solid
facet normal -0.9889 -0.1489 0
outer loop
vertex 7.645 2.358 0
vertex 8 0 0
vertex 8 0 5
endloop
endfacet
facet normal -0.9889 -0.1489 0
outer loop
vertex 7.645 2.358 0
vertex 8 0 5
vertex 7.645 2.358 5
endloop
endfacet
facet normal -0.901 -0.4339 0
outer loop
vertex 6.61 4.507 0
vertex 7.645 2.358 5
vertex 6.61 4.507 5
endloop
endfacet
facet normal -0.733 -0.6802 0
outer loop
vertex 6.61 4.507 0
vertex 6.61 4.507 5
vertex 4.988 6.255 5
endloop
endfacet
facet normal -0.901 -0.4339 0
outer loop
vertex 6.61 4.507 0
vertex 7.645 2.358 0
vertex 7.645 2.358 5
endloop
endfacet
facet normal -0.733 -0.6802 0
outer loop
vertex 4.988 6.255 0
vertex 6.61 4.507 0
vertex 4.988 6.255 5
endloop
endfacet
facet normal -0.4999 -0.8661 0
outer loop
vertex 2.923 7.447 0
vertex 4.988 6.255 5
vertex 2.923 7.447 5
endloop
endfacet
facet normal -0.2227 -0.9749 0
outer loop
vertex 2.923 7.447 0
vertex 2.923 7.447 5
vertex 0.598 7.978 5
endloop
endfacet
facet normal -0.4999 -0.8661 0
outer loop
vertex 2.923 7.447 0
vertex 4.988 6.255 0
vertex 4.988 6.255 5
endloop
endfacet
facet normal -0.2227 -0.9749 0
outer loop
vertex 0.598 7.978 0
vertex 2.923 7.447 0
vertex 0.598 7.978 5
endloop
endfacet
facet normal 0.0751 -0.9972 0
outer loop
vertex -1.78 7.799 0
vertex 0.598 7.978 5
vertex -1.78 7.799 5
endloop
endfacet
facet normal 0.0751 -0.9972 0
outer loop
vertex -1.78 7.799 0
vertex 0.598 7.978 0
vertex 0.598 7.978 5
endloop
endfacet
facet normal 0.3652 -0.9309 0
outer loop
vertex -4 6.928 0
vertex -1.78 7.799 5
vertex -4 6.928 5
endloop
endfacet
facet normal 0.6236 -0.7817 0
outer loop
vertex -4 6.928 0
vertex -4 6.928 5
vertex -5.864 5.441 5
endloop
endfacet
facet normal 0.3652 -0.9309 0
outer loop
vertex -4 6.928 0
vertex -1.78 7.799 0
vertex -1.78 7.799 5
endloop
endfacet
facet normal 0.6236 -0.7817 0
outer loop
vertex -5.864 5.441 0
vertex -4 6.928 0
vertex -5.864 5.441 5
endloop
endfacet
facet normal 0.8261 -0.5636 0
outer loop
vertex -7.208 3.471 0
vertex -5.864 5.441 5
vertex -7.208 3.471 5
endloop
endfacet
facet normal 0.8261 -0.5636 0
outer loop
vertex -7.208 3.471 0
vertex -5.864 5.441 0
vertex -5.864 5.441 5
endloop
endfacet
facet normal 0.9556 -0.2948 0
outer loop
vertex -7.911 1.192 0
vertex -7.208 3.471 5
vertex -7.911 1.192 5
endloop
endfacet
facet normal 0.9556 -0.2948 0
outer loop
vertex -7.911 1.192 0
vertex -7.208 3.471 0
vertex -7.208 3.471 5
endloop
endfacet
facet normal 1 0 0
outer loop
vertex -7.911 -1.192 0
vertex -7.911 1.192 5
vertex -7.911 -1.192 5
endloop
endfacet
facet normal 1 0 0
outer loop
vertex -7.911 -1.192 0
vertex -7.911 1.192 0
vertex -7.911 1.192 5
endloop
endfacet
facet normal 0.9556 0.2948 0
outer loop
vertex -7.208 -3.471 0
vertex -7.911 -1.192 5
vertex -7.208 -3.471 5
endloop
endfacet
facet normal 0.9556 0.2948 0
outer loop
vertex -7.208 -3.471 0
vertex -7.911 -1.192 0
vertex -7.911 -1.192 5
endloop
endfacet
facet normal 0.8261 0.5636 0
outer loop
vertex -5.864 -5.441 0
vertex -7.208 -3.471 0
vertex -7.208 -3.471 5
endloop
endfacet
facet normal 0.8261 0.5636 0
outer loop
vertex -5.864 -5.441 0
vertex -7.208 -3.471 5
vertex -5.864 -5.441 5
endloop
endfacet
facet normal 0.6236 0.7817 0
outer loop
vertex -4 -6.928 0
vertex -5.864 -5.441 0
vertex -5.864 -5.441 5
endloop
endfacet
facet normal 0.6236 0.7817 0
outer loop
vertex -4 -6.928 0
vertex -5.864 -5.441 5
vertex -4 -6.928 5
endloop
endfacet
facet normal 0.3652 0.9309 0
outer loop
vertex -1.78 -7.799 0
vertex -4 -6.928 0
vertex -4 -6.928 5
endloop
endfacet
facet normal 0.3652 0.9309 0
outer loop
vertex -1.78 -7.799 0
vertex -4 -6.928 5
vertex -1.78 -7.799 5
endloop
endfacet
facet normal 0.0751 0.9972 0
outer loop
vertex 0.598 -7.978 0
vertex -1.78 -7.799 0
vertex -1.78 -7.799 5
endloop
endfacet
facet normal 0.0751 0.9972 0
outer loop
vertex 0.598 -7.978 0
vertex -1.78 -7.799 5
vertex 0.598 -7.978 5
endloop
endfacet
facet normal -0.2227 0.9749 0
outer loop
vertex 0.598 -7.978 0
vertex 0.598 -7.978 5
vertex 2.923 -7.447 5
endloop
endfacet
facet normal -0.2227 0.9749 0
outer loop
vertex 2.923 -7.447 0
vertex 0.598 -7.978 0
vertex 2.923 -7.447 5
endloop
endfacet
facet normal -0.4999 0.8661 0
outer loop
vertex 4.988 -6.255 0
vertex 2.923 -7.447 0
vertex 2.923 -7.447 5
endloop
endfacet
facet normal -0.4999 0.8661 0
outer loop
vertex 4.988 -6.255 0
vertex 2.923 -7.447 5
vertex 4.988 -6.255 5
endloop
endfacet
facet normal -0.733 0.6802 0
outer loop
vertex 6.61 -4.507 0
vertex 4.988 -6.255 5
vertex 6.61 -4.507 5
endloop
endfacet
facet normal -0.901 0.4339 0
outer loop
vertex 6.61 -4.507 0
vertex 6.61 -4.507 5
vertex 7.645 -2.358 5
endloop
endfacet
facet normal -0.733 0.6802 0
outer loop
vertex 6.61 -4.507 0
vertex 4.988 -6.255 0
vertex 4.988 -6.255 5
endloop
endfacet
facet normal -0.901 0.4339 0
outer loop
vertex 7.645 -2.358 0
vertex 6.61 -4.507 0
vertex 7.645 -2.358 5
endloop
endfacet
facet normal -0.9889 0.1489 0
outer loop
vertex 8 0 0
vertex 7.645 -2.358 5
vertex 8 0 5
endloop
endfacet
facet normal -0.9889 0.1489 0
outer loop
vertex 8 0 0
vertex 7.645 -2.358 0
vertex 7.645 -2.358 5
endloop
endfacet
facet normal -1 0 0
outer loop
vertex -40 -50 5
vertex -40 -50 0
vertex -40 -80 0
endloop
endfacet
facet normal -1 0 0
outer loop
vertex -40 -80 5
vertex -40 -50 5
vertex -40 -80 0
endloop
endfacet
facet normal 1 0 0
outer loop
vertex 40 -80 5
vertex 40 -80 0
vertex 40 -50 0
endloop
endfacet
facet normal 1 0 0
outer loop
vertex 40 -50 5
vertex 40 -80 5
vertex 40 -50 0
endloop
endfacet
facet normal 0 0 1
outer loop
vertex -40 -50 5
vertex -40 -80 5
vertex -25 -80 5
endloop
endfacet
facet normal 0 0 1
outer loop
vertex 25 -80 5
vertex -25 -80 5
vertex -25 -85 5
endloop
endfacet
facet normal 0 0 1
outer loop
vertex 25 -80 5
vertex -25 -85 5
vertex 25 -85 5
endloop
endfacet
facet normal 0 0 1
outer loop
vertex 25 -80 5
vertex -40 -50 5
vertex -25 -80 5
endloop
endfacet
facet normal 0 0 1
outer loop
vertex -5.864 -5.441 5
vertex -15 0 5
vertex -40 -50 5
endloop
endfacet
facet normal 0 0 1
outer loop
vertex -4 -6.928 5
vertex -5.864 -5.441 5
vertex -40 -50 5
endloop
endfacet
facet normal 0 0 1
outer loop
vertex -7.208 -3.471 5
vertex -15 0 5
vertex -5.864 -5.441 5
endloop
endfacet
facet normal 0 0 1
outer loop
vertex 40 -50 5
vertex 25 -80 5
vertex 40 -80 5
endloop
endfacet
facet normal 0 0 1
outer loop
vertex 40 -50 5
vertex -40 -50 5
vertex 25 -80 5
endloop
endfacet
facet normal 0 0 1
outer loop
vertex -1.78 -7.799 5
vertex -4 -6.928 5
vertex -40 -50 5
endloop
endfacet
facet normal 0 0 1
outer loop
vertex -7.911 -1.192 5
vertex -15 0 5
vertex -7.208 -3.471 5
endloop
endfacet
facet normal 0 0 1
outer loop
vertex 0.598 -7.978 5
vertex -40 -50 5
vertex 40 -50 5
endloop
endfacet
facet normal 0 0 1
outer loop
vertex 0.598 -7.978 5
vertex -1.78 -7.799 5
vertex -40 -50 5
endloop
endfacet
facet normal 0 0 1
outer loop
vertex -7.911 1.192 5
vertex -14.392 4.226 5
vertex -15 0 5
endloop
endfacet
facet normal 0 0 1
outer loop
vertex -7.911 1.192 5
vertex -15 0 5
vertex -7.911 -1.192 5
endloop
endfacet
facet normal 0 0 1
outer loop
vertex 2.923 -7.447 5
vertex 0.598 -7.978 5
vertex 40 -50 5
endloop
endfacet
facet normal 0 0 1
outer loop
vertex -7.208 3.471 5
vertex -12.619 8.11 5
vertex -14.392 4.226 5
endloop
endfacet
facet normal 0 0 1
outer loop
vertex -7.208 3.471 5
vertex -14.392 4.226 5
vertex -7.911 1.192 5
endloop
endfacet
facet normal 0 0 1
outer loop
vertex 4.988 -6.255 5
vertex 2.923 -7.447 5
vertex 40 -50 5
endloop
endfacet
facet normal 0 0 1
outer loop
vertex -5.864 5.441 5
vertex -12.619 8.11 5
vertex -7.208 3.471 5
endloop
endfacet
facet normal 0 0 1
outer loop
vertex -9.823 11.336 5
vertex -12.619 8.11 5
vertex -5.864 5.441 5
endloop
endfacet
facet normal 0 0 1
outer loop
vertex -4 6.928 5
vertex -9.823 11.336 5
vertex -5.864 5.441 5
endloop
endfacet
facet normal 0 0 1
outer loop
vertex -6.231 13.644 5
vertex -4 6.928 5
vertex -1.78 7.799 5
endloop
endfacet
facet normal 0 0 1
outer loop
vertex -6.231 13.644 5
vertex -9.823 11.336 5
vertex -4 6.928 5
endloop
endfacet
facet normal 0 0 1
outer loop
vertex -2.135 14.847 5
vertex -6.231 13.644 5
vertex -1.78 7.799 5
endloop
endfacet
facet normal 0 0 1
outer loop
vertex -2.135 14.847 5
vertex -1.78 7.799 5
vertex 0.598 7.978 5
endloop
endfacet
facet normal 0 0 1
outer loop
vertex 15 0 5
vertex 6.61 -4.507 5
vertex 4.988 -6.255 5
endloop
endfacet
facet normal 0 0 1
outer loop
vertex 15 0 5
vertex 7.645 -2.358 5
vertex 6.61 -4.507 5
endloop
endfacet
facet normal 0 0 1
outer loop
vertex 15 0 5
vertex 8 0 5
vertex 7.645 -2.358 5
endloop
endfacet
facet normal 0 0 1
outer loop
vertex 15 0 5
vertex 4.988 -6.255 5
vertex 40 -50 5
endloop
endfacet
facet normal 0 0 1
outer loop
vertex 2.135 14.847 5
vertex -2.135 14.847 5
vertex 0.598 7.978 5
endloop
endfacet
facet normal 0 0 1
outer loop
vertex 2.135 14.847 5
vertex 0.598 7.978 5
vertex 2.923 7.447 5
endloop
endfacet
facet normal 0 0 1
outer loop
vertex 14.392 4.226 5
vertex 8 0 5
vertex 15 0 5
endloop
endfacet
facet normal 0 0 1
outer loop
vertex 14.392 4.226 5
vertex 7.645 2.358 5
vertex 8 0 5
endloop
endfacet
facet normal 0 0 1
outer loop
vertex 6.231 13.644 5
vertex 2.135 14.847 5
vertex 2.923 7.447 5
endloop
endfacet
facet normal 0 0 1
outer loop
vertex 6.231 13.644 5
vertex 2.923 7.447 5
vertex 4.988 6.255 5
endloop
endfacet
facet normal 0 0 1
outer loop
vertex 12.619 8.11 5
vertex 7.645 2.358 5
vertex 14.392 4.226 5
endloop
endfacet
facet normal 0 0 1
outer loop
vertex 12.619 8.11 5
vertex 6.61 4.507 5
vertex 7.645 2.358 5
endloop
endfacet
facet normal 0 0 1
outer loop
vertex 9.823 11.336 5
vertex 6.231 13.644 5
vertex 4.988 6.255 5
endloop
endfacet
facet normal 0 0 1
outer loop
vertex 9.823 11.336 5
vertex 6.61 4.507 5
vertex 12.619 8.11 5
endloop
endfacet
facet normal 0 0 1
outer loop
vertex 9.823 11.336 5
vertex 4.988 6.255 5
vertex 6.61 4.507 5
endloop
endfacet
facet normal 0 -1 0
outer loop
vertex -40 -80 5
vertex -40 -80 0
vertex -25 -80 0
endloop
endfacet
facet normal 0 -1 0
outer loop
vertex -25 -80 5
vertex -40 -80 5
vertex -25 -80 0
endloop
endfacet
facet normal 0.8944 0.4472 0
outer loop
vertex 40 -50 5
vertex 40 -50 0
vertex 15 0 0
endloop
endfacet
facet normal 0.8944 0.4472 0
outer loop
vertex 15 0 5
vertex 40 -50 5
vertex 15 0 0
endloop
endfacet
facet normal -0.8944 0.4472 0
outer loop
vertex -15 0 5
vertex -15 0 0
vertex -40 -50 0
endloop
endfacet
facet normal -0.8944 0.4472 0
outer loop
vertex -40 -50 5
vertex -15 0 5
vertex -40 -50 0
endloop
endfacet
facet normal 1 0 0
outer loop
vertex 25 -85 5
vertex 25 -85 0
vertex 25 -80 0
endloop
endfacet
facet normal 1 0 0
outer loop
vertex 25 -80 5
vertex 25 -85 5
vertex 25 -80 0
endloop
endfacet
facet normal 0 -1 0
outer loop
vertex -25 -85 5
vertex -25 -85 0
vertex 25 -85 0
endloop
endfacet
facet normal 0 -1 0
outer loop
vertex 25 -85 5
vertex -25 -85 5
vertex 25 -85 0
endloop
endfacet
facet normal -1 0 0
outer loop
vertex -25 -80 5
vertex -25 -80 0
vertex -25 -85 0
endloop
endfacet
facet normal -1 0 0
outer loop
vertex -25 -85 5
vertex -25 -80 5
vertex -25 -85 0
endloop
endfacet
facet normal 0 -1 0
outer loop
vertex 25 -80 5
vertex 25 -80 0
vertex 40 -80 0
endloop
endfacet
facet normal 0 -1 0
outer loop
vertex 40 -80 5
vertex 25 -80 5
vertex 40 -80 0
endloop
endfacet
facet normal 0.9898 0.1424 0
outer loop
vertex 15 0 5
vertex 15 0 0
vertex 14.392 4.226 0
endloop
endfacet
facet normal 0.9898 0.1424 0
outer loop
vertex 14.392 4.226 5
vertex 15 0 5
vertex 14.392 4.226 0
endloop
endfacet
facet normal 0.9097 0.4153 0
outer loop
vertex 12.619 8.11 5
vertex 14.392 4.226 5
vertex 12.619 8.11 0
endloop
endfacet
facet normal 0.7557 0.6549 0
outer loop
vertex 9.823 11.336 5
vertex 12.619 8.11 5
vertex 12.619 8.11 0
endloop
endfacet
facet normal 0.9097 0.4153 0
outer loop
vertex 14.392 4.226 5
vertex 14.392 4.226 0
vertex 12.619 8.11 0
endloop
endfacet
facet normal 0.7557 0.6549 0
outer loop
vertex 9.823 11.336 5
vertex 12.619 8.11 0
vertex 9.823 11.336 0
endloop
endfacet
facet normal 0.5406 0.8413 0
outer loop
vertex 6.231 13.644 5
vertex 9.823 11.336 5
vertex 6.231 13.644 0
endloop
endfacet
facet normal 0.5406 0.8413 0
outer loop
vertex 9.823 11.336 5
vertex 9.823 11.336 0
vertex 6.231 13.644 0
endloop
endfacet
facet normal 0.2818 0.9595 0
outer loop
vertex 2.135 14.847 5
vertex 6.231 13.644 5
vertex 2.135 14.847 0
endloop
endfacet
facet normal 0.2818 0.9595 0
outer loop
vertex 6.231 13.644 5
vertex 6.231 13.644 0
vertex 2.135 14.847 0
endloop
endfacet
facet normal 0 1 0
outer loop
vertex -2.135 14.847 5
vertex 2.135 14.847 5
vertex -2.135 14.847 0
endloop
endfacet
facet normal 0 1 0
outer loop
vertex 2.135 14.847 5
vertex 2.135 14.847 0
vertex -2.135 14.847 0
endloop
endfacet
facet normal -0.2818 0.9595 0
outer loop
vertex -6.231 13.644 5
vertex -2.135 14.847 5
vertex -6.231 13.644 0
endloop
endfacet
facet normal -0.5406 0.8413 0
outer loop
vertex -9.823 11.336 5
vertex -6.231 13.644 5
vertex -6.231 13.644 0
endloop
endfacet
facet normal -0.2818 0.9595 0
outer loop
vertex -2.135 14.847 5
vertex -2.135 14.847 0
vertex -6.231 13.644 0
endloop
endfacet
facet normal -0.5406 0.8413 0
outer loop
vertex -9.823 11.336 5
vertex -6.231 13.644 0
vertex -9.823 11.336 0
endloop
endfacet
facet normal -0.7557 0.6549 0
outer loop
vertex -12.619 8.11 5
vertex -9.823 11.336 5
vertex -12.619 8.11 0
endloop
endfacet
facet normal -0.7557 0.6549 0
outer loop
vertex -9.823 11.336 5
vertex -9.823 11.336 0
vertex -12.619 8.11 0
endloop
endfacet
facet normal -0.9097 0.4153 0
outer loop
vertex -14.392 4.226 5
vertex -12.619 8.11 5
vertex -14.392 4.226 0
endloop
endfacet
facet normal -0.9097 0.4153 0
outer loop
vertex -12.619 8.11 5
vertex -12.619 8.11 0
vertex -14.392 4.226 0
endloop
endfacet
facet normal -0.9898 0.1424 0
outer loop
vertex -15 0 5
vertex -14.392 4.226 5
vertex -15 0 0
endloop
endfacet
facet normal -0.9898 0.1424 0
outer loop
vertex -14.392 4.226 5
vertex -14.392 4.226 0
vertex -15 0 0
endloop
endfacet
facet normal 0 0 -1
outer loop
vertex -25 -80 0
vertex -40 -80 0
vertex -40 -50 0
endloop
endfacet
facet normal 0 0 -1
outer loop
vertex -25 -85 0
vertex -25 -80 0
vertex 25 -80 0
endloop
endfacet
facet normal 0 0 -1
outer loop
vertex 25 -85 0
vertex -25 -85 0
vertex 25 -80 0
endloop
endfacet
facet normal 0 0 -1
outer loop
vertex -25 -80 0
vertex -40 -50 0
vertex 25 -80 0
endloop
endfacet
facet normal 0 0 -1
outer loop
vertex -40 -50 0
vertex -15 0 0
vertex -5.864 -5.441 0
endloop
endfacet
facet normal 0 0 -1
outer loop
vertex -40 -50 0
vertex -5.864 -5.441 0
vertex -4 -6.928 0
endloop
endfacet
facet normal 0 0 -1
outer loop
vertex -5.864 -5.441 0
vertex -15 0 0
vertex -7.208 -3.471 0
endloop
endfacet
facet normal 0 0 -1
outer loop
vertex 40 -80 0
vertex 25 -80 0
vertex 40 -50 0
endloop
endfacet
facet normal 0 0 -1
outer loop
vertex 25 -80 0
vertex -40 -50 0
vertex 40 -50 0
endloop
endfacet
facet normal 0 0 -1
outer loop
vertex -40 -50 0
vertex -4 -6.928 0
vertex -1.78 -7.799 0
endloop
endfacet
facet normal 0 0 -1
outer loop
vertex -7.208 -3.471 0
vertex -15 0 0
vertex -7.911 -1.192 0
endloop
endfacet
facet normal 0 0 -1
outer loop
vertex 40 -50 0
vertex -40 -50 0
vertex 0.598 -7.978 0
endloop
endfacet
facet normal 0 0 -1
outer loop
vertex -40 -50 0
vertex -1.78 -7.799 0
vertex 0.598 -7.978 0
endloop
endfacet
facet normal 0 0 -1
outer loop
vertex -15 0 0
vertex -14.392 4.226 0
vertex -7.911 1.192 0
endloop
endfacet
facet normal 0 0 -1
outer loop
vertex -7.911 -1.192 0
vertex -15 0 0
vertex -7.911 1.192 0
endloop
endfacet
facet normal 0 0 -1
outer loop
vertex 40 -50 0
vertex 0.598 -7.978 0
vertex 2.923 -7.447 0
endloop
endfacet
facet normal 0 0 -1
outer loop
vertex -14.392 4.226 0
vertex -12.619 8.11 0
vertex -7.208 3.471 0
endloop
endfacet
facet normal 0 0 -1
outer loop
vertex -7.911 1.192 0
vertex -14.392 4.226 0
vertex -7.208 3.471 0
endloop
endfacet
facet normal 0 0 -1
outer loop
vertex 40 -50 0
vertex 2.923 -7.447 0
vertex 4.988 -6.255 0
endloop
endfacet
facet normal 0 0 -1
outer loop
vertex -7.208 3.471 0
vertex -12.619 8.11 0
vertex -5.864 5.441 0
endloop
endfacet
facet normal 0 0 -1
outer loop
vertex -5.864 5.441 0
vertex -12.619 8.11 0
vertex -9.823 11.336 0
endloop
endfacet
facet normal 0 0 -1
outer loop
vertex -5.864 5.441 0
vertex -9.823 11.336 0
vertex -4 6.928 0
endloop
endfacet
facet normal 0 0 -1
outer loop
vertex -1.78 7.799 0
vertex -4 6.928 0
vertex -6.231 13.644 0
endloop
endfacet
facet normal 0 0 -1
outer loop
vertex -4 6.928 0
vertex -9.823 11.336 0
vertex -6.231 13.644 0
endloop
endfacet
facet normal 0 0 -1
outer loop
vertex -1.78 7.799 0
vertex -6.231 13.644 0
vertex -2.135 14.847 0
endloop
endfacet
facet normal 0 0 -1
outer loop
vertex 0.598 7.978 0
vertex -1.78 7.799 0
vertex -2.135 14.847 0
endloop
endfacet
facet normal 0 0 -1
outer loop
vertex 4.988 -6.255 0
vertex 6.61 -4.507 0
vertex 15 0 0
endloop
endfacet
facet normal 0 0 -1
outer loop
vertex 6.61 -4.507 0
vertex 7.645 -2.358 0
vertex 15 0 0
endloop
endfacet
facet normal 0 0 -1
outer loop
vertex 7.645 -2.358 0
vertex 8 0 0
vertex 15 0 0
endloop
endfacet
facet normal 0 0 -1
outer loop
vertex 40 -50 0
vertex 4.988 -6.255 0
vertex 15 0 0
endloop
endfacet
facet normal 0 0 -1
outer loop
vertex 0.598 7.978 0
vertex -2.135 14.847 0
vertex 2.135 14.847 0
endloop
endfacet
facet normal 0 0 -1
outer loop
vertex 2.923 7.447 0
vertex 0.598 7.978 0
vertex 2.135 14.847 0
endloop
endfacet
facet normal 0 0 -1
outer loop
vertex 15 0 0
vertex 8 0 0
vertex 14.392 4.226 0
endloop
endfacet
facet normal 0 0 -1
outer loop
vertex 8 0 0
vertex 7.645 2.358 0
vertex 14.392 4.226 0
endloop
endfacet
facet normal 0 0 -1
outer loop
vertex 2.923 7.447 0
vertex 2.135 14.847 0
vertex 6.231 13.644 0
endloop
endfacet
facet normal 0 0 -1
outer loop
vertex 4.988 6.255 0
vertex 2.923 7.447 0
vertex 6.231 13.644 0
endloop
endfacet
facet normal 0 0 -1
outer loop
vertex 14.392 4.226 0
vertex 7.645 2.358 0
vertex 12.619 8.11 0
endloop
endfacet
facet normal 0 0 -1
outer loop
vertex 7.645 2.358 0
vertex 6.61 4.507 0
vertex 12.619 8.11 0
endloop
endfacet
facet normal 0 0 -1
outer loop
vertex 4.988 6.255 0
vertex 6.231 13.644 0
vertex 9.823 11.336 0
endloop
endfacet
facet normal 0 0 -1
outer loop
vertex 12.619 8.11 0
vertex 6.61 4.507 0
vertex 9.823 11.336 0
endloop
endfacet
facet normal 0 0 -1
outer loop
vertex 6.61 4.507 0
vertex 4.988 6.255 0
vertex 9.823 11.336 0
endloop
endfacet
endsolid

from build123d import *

# Parameters (mm, degrees)
SKETCH1_R           = 8
BOSS_EXTRUDE1_DEPTH = 5


with BuildPart() as part:
    # Sketch1 → Boss-Extrude1 (new body)
    with BuildSketch(Plane.XY):
        with BuildLine():
            Line((-40, -80), (-25, -80))
            Line((-25, -80), (-25, -85))
            Line((-25, -85), (25, -85))
            Line((25, -85), (25, -80))
            Line((25, -80), (40, -80))
            Line((40, -80), (40, -50))
            Line((40, -50), (15, 0))
            ThreePointArc((15, 0), (0, 15), (-15, 0))
            Line((-15, 0), (-40, -50))
            Line((-40, -50), (-40, -80))
        make_face()
        Circle(SKETCH1_R, mode=Mode.SUBTRACT)
    extrude(amount=BOSS_EXTRUDE1_DEPTH)


solid = part.part
